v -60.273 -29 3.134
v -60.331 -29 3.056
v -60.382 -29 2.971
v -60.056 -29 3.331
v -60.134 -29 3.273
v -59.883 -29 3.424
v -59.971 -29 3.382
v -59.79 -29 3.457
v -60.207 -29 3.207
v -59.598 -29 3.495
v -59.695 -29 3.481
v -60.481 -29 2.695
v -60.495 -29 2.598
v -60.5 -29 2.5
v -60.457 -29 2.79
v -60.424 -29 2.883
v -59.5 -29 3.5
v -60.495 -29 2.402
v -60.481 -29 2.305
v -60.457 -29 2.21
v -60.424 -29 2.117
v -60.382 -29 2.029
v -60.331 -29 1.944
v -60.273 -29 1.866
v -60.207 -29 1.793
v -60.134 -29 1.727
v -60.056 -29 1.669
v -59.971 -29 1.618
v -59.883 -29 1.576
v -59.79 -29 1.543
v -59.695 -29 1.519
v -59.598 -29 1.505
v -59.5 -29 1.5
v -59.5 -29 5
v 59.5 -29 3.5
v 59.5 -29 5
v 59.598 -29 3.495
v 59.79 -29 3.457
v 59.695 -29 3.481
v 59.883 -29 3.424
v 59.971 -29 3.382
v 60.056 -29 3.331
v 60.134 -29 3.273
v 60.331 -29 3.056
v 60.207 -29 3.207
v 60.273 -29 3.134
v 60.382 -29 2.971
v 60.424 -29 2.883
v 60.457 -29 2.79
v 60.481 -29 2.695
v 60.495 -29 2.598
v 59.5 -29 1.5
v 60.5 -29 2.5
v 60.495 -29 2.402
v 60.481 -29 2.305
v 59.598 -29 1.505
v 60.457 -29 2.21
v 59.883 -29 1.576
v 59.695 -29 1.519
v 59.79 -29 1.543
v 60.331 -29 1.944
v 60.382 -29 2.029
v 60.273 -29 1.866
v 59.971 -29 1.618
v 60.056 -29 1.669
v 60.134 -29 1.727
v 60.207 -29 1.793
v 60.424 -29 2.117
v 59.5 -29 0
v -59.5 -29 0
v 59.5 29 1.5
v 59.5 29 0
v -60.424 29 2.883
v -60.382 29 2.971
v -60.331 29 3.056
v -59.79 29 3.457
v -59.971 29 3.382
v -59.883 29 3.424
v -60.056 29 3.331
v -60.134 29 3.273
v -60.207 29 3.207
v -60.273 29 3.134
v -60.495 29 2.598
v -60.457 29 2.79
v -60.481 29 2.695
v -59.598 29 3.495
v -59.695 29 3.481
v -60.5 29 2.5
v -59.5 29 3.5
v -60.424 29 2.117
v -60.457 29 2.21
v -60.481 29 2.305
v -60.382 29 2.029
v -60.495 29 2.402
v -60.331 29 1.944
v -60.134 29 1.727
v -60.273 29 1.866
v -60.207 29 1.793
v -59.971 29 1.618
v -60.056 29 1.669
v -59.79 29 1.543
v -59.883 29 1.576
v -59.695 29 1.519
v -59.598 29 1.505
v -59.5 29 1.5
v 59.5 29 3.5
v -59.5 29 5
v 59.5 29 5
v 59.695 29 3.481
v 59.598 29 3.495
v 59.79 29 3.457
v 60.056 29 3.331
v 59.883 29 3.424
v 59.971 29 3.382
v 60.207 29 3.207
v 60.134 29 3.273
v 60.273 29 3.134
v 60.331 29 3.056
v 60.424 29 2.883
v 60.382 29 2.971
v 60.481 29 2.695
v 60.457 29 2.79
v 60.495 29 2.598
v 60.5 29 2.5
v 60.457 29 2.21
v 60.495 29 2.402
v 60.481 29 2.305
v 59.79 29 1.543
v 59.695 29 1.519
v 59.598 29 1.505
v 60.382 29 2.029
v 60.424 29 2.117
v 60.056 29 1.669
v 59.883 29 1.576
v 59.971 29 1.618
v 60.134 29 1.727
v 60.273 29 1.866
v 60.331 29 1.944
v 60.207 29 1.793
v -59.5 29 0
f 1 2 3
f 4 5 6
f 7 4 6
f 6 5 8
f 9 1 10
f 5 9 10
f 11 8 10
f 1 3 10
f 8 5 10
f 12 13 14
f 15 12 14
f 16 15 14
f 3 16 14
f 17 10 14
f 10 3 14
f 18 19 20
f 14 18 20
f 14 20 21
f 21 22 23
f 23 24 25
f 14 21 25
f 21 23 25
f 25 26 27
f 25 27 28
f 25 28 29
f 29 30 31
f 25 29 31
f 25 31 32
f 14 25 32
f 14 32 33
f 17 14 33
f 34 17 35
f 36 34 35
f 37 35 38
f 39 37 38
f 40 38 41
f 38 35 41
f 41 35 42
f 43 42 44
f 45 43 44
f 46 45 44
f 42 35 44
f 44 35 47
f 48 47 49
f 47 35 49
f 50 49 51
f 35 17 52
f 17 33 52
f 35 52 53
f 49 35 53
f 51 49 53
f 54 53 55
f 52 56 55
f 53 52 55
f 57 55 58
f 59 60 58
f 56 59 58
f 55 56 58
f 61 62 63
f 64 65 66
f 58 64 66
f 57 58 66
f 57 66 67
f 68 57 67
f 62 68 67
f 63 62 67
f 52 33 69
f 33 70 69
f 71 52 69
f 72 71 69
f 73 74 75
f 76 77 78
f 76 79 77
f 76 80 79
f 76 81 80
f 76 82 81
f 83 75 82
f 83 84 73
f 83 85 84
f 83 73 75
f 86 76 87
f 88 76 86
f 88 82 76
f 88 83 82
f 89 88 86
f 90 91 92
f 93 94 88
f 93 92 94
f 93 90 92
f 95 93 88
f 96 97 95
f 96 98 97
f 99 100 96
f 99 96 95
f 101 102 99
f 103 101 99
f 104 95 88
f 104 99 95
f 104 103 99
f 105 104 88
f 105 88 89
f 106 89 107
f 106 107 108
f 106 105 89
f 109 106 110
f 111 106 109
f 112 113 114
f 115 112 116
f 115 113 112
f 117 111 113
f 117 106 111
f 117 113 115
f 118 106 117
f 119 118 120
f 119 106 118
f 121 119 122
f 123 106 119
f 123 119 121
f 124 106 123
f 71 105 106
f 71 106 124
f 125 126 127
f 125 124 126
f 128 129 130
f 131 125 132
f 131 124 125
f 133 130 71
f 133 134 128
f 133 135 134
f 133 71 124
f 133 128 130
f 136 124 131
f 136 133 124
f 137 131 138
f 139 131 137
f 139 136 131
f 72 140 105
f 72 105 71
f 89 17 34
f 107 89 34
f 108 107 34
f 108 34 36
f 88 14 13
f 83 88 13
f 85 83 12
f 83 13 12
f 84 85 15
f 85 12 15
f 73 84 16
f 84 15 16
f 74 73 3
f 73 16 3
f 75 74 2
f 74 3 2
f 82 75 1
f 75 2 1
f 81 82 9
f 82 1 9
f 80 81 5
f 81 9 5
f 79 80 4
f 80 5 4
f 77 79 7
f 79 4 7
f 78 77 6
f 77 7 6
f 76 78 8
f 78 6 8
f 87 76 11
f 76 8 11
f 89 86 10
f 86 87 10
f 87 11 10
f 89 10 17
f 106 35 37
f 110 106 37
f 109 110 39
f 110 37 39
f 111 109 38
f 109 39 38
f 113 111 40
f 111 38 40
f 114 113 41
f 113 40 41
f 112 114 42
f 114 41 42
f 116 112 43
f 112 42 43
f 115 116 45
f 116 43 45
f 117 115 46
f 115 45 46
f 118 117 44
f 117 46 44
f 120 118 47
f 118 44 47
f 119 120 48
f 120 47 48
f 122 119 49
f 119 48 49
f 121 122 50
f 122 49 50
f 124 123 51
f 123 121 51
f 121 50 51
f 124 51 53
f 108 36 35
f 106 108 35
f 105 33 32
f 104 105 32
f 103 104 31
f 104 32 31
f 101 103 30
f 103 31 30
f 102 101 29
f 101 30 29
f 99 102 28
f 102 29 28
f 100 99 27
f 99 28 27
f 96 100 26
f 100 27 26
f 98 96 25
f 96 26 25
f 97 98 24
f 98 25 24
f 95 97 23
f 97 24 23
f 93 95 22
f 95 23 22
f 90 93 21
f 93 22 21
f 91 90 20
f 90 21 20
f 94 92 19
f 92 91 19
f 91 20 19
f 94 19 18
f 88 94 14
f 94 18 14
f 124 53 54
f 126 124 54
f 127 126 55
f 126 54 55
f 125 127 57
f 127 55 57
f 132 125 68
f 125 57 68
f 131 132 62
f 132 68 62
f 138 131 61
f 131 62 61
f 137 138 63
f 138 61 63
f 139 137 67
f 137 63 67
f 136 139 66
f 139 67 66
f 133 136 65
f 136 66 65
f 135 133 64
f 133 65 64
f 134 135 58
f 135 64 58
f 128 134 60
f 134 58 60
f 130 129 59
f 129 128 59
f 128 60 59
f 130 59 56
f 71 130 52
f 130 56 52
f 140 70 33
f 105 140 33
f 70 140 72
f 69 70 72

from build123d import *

# Parameters (mm, degrees)
F0_W     = 121
F0_H     = 58
F1_DEPTH = 5
F3_DEPTH = 58.001


with BuildPart() as f1:
    # F0 (on Top) → F1 (new body)
    with BuildSketch(Plane.XY):
        Rectangle(F0_W, F0_H)
    extrude(amount=F1_DEPTH)

    # F2 (on face) → F3 (cut, through all)
    with BuildSketch(Plane.XZ.offset(29)):
        with BuildLine():
            Line((-59.5, 3.5), (-59.5, 5))
            Line((-59.5, 5), (-60.5, 5))
            Line((-60.5, 5), (-60.5, 2.5))
            ThreePointArc((-60.5, 2.5), (-60.207107, 3.207107), (-59.5, 3.5))
        make_face()
        with BuildLine():
            Line((-60.5, 0), (-59.5, 0))
            Line((-59.5, 0), (-59.5, 1.5))
            ThreePointArc((-59.5, 1.5), (-60.207107, 1.792893), (-60.5, 2.5))
            Line((-60.5, 2.5), (-60.5, 0))
        make_face()
        with BuildLine():
            Line((60.5, 0), (60.5, 2.5))
            ThreePointArc((60.5, 2.5), (60.207107, 1.792893), (59.5, 1.5))
            Line((59.5, 1.5), (59.5, 0))
            Line((59.5, 0), (60.5, 0))
        make_face()
        with BuildLine():
            ThreePointArc((59.5, 3.5), (60.207107, 3.207107), (60.5, 2.5))
            Line((60.5, 2.5), (60.5, 5))
            Line((60.5, 5), (59.5, 5))
            Line((59.5, 5), (59.5, 3.5))
        make_face()
    extrude(amount=-F3_DEPTH, mode=Mode.SUBTRACT)


solid = f1.part
